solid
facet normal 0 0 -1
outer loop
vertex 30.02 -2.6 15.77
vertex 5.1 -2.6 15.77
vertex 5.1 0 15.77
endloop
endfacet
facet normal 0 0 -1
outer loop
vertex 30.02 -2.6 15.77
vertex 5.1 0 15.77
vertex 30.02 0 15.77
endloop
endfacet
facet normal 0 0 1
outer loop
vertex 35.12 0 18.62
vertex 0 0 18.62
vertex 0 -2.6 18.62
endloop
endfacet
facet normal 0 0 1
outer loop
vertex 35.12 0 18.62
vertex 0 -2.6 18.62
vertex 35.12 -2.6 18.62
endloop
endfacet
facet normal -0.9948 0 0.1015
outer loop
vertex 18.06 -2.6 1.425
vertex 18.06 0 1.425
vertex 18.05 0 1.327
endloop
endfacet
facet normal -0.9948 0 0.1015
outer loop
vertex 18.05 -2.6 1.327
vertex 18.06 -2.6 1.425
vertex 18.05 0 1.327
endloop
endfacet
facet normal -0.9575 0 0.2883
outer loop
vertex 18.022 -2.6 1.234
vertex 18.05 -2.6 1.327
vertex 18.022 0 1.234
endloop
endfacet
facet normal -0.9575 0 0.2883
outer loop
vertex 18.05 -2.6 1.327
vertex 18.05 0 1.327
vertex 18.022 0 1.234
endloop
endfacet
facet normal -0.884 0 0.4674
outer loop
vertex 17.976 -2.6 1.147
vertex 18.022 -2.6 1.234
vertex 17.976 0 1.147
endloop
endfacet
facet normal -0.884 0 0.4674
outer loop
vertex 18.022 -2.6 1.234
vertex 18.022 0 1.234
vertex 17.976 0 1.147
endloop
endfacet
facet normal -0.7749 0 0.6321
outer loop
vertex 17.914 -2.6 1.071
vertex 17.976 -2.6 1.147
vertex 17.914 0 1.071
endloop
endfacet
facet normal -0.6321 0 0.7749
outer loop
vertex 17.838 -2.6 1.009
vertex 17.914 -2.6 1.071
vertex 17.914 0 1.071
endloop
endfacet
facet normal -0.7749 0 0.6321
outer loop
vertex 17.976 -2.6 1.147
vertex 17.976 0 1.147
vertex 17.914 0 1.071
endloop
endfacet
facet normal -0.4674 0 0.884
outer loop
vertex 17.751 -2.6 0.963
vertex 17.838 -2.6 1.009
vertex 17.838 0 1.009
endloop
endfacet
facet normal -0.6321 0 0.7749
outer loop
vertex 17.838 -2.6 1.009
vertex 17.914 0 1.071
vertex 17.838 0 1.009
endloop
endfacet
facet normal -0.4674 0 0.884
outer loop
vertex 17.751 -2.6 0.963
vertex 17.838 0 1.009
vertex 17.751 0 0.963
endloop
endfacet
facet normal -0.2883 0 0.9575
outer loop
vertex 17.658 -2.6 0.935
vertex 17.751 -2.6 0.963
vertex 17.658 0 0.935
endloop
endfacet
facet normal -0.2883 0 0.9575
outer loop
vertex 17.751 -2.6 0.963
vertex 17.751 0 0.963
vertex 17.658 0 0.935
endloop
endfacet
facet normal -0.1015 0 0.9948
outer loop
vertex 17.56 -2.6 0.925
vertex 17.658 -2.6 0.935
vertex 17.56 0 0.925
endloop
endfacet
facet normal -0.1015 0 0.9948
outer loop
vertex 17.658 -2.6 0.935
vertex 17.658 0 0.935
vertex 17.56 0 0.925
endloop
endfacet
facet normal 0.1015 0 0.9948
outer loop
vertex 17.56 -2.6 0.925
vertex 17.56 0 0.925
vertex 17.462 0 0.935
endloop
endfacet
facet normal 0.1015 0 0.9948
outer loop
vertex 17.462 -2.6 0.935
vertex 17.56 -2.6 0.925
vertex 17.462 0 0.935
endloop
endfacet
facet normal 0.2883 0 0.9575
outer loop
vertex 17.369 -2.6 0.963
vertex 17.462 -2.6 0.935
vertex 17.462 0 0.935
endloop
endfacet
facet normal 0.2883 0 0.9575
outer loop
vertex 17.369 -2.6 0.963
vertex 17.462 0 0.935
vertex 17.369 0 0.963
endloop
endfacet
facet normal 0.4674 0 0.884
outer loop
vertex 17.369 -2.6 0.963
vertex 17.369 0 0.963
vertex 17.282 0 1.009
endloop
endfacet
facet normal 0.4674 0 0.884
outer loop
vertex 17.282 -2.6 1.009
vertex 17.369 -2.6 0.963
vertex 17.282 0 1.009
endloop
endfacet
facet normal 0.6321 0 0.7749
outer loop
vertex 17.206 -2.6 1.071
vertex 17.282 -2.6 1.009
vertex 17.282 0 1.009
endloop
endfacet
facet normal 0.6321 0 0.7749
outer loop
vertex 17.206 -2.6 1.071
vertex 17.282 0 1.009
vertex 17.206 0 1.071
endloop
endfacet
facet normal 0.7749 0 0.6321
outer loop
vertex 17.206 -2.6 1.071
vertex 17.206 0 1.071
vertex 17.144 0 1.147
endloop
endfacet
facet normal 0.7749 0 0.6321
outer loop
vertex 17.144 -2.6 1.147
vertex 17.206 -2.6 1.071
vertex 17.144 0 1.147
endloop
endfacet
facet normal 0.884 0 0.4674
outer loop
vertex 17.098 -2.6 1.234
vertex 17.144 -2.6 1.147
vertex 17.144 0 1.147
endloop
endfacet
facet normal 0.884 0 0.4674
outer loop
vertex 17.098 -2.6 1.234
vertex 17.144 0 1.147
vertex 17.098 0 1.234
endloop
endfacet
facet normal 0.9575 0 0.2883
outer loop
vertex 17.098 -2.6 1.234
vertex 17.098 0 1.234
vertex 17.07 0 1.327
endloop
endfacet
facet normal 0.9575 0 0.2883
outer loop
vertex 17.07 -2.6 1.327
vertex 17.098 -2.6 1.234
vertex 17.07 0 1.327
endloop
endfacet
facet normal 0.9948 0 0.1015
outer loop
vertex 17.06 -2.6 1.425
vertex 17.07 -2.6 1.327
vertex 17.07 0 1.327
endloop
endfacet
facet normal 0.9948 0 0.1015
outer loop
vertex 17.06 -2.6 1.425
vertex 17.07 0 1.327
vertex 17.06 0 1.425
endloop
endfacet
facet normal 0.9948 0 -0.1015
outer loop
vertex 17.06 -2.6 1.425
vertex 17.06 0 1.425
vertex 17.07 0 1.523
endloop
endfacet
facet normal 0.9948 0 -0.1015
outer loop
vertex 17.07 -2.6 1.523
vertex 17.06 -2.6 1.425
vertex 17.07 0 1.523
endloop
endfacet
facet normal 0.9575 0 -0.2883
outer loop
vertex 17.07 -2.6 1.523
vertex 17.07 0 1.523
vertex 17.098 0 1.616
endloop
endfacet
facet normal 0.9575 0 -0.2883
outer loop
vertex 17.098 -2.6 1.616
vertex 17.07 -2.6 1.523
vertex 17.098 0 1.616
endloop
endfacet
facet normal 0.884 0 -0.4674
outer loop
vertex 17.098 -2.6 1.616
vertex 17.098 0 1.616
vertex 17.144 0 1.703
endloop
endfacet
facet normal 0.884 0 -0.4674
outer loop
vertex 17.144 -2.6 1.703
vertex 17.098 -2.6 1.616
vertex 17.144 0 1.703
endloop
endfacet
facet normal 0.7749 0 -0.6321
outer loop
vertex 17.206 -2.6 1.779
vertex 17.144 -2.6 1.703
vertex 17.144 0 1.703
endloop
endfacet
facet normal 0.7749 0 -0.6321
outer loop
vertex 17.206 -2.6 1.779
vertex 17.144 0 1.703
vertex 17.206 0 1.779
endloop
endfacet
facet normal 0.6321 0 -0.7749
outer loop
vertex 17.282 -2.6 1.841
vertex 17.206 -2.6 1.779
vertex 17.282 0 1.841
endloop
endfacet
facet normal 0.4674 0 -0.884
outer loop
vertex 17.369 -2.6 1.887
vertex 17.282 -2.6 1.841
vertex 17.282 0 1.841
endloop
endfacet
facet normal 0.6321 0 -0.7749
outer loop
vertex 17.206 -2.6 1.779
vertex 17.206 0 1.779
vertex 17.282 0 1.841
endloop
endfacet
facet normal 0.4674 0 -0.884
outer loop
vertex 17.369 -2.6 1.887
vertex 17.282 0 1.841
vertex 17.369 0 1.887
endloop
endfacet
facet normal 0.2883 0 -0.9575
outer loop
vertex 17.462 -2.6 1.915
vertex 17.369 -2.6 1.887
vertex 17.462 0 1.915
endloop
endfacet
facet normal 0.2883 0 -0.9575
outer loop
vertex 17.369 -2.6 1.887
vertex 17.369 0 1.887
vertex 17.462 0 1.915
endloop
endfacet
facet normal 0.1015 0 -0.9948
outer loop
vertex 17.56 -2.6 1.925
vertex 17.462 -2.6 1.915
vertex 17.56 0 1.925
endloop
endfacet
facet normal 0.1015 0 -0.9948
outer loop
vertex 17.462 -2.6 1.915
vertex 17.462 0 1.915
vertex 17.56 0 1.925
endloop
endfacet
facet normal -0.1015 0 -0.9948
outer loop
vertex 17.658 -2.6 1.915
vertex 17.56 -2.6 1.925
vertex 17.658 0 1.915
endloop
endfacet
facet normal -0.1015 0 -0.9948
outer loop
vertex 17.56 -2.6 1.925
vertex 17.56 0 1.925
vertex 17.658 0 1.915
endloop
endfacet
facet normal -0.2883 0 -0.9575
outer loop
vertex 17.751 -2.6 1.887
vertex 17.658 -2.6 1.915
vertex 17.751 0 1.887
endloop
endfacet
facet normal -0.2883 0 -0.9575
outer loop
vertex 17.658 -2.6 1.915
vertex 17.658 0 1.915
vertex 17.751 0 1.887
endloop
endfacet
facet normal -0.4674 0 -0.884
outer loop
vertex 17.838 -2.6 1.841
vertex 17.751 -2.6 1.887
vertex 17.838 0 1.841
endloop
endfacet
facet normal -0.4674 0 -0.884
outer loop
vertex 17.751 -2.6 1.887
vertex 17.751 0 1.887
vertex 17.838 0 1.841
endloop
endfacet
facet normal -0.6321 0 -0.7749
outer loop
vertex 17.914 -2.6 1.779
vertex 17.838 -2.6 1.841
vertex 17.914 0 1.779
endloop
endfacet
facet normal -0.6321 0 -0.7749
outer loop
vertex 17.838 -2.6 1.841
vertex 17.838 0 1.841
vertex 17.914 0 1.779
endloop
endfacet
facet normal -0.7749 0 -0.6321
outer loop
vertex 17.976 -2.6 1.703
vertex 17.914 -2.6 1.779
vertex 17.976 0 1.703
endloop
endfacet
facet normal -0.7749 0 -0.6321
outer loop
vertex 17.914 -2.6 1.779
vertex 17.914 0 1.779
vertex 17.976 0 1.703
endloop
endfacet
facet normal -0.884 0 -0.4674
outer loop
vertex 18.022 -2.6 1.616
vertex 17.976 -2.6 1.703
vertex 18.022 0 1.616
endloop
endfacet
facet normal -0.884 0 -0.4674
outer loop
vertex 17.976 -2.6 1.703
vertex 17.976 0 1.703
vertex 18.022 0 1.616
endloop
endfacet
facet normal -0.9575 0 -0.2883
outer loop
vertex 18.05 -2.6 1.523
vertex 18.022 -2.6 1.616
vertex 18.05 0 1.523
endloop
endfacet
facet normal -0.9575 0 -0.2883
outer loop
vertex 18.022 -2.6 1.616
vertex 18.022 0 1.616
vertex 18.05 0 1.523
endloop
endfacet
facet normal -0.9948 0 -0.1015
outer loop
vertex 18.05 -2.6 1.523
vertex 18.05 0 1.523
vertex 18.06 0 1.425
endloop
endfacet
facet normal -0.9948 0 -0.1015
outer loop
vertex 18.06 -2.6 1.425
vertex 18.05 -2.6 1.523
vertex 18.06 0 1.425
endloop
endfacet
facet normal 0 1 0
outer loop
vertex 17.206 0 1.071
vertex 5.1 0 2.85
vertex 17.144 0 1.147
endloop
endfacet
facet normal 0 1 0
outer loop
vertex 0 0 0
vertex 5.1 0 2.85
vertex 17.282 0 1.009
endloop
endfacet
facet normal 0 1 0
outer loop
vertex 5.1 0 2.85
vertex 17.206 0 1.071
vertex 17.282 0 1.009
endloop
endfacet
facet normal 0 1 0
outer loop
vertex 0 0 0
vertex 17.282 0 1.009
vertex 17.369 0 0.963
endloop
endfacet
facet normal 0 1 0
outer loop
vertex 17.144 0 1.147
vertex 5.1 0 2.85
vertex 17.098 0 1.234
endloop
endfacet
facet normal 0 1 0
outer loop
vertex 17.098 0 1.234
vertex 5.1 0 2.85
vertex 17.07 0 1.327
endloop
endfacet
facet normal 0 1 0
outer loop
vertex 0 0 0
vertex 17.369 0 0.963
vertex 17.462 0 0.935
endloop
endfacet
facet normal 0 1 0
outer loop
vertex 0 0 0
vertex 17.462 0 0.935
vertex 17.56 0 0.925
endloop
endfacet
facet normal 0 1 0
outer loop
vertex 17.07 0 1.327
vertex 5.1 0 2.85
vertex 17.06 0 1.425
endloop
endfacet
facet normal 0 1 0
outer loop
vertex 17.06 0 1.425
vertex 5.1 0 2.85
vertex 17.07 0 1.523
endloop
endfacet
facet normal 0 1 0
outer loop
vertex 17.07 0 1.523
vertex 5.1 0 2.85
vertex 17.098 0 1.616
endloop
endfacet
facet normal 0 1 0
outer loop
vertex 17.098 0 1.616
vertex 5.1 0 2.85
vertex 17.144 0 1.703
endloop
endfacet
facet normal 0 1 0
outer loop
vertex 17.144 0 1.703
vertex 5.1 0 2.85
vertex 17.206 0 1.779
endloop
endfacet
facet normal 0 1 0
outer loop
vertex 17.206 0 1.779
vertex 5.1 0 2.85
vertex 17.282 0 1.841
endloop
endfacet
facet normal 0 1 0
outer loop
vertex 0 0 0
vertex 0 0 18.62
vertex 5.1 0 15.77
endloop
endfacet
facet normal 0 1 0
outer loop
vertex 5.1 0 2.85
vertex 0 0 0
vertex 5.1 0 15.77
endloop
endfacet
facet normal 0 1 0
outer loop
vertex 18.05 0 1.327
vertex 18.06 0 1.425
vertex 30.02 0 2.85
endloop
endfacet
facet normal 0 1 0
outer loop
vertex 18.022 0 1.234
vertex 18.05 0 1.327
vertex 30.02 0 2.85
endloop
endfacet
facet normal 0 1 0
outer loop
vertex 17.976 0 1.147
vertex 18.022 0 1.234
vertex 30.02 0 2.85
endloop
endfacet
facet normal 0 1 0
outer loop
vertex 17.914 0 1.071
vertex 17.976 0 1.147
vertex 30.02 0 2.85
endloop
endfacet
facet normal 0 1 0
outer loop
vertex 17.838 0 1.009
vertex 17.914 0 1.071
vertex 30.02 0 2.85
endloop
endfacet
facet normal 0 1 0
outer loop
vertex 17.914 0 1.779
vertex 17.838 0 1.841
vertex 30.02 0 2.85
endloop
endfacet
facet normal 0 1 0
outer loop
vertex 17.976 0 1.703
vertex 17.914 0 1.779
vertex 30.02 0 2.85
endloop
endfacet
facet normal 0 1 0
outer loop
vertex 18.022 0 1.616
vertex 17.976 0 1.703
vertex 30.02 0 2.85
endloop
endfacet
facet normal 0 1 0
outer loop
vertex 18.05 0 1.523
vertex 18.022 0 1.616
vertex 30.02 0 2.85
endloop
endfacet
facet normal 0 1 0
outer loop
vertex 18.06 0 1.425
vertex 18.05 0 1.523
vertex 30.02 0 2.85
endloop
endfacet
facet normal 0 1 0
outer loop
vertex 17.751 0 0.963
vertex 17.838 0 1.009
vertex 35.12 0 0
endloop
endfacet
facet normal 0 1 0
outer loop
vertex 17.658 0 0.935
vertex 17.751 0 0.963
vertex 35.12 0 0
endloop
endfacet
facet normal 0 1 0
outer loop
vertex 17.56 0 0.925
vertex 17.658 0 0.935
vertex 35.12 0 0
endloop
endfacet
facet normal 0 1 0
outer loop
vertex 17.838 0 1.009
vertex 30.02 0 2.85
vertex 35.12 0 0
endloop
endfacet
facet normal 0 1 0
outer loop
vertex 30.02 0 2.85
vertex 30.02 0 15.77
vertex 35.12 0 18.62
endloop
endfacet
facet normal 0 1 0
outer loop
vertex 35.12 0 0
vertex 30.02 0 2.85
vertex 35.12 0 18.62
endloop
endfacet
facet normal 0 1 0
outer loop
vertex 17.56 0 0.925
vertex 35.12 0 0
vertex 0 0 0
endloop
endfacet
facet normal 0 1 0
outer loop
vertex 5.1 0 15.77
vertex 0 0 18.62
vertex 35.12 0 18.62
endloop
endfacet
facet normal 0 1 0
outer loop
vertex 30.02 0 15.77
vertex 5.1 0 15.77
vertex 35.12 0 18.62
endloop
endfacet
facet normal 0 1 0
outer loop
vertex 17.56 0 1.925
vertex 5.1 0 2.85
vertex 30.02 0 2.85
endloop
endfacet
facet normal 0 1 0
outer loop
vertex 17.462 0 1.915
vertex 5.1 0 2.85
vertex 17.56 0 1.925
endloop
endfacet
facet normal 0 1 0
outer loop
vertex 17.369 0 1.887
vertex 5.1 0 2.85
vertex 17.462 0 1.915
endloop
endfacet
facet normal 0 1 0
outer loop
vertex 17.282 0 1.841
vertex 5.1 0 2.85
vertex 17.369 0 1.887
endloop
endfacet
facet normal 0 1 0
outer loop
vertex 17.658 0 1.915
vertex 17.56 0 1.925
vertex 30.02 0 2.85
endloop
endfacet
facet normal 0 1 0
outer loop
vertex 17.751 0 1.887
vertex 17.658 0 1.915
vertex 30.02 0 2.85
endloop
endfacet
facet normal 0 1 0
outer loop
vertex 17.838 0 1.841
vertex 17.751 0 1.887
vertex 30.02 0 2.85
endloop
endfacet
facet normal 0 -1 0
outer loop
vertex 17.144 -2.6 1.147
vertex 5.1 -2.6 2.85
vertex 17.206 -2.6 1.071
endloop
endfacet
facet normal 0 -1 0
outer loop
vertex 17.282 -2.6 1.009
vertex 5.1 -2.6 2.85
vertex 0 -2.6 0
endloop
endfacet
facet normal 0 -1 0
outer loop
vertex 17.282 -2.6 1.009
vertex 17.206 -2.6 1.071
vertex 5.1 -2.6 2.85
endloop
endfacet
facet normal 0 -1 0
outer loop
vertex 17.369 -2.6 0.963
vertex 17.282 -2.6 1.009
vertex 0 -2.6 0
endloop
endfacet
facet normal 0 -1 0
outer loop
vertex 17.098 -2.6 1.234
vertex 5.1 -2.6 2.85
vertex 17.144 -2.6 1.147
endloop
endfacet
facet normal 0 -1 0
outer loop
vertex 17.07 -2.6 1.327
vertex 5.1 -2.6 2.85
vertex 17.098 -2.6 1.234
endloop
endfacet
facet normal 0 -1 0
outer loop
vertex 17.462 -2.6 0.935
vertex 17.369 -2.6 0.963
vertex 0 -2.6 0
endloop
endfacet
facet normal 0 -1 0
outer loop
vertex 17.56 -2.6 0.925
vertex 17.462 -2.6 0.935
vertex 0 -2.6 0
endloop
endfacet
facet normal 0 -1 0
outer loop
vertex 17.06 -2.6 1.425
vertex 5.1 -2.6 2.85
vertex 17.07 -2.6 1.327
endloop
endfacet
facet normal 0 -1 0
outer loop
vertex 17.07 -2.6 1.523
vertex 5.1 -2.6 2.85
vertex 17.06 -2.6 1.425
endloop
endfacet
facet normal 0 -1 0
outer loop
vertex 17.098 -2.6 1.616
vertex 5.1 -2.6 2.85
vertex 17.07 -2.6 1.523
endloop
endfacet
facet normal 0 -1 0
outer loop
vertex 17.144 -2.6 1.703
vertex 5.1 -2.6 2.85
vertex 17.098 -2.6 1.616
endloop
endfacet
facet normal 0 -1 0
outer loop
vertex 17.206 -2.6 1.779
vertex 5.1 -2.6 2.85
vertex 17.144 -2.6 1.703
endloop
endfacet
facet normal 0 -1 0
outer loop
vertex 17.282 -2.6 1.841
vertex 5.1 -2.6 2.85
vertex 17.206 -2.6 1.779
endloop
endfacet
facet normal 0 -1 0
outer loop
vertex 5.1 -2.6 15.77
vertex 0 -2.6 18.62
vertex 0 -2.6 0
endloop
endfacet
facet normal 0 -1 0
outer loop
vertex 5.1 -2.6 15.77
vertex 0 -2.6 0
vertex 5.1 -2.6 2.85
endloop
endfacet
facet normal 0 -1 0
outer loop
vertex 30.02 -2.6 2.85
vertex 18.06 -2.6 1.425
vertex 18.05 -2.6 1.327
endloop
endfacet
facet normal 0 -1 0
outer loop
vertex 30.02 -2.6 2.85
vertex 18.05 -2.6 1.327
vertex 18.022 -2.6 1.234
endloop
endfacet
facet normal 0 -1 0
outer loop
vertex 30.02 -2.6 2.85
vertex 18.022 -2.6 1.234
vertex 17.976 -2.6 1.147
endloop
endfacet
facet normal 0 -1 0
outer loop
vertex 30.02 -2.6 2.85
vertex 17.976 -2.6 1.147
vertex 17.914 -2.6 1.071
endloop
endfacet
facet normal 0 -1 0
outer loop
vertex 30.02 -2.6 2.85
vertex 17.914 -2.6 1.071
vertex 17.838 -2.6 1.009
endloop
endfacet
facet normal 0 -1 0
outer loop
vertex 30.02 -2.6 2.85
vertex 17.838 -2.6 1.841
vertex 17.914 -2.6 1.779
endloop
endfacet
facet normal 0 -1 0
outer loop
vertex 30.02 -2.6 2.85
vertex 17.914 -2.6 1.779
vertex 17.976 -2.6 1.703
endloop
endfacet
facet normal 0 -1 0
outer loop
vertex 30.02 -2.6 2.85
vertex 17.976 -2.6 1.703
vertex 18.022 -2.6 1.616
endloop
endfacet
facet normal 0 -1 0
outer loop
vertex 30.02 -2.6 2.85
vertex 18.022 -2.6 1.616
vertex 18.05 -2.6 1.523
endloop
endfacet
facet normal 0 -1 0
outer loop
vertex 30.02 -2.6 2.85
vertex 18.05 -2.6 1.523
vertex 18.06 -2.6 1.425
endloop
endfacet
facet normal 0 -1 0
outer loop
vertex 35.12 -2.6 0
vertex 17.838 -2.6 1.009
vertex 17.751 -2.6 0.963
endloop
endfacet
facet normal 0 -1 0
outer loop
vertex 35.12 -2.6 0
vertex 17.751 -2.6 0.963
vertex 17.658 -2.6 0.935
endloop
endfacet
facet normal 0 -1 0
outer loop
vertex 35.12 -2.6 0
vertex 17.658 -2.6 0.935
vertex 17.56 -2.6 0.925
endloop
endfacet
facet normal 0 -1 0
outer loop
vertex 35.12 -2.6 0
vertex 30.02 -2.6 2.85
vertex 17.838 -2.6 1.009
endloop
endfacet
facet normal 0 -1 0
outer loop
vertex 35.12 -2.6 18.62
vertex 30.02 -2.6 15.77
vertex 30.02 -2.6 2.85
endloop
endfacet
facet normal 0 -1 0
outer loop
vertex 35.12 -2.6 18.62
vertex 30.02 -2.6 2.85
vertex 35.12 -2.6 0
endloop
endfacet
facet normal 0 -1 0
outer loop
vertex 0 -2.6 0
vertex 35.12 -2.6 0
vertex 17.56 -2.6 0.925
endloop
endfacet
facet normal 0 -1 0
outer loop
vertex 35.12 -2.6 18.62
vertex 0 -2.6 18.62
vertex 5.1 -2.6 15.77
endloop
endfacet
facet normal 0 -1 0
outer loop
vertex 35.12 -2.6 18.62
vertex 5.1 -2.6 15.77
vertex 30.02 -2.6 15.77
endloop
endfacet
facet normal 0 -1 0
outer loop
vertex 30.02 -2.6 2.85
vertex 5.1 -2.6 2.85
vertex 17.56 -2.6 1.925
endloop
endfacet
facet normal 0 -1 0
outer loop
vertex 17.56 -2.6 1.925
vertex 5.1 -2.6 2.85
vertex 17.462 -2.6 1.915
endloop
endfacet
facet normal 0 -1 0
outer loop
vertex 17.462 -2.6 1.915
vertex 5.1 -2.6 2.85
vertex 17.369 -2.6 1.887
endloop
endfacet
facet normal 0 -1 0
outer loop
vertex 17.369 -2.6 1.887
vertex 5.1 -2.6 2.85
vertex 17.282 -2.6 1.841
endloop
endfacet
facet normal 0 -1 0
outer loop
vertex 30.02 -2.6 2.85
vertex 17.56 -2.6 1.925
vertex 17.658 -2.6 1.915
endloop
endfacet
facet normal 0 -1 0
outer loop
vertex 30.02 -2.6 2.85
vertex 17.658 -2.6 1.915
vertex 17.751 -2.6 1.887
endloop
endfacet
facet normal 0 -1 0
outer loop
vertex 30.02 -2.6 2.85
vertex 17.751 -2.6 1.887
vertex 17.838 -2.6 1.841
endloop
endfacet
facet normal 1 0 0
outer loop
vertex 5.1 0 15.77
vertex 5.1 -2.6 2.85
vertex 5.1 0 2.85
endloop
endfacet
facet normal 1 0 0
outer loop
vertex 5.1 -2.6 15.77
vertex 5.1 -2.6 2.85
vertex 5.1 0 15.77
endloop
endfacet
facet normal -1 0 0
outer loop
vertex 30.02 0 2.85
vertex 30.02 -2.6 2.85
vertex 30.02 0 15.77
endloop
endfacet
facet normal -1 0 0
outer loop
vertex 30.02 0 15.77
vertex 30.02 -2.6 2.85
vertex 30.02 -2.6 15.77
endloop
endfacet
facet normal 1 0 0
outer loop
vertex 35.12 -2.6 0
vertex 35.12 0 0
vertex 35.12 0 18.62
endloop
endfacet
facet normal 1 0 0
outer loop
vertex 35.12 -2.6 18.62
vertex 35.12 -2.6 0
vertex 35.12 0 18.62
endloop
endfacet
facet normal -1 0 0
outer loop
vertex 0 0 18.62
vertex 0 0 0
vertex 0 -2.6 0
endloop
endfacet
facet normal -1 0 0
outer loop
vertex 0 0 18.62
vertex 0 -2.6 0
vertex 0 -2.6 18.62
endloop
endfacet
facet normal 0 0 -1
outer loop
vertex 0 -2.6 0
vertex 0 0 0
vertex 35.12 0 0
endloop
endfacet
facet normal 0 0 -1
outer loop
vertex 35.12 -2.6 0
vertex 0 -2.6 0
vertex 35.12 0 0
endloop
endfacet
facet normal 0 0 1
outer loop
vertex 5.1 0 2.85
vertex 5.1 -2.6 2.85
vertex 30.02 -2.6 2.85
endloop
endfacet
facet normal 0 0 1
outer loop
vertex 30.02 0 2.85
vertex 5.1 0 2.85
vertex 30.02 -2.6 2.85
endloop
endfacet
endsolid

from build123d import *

# Parameters (mm, degrees)
SKETCH_W        = 35.12
SKETCH_H        = 18.62
PAD_DEPTH       = 2.6
SKETCH002_W     = 24.92
SKETCH002_H     = 12.92
POCKET_DEPTH    = 2.6
SKETCH003_R     = 0.5
SKETCH003_W     = 2.01
SKETCH003_H     = 3.5
POCKET001_DEPTH = 5


with BuildPart() as part:
    # Sketch → Pad (new body)
    with BuildSketch(Plane.XZ):
        with Locations((17.56, 9.31)):
            Rectangle(SKETCH_W, SKETCH_H)
    extrude(amount=PAD_DEPTH)

    # Sketch002 (on Face6 of Pad) → Pocket (cut)
    with BuildSketch(Plane.XZ.offset(2.6)):
        with Locations((17.56, 9.31)):
            Rectangle(SKETCH002_W, SKETCH002_H)
    extrude(amount=-POCKET_DEPTH, mode=Mode.SUBTRACT)

    # Sketch003 (on Face4 of Pocket) → Pocket001 (cut)
    with BuildSketch(Plane(origin=(0, 0, 0), x_dir=(1, 0, 0), z_dir=(0, 1, 0))):
        with Locations((17.56, -1.425)):
            Circle(SKETCH003_R)
        with Locations((27.953742, -8.544061)):
            Rectangle(SKETCH003_W, SKETCH003_H)
    extrude(amount=-POCKET001_DEPTH, mode=Mode.SUBTRACT)


solid = part.part
